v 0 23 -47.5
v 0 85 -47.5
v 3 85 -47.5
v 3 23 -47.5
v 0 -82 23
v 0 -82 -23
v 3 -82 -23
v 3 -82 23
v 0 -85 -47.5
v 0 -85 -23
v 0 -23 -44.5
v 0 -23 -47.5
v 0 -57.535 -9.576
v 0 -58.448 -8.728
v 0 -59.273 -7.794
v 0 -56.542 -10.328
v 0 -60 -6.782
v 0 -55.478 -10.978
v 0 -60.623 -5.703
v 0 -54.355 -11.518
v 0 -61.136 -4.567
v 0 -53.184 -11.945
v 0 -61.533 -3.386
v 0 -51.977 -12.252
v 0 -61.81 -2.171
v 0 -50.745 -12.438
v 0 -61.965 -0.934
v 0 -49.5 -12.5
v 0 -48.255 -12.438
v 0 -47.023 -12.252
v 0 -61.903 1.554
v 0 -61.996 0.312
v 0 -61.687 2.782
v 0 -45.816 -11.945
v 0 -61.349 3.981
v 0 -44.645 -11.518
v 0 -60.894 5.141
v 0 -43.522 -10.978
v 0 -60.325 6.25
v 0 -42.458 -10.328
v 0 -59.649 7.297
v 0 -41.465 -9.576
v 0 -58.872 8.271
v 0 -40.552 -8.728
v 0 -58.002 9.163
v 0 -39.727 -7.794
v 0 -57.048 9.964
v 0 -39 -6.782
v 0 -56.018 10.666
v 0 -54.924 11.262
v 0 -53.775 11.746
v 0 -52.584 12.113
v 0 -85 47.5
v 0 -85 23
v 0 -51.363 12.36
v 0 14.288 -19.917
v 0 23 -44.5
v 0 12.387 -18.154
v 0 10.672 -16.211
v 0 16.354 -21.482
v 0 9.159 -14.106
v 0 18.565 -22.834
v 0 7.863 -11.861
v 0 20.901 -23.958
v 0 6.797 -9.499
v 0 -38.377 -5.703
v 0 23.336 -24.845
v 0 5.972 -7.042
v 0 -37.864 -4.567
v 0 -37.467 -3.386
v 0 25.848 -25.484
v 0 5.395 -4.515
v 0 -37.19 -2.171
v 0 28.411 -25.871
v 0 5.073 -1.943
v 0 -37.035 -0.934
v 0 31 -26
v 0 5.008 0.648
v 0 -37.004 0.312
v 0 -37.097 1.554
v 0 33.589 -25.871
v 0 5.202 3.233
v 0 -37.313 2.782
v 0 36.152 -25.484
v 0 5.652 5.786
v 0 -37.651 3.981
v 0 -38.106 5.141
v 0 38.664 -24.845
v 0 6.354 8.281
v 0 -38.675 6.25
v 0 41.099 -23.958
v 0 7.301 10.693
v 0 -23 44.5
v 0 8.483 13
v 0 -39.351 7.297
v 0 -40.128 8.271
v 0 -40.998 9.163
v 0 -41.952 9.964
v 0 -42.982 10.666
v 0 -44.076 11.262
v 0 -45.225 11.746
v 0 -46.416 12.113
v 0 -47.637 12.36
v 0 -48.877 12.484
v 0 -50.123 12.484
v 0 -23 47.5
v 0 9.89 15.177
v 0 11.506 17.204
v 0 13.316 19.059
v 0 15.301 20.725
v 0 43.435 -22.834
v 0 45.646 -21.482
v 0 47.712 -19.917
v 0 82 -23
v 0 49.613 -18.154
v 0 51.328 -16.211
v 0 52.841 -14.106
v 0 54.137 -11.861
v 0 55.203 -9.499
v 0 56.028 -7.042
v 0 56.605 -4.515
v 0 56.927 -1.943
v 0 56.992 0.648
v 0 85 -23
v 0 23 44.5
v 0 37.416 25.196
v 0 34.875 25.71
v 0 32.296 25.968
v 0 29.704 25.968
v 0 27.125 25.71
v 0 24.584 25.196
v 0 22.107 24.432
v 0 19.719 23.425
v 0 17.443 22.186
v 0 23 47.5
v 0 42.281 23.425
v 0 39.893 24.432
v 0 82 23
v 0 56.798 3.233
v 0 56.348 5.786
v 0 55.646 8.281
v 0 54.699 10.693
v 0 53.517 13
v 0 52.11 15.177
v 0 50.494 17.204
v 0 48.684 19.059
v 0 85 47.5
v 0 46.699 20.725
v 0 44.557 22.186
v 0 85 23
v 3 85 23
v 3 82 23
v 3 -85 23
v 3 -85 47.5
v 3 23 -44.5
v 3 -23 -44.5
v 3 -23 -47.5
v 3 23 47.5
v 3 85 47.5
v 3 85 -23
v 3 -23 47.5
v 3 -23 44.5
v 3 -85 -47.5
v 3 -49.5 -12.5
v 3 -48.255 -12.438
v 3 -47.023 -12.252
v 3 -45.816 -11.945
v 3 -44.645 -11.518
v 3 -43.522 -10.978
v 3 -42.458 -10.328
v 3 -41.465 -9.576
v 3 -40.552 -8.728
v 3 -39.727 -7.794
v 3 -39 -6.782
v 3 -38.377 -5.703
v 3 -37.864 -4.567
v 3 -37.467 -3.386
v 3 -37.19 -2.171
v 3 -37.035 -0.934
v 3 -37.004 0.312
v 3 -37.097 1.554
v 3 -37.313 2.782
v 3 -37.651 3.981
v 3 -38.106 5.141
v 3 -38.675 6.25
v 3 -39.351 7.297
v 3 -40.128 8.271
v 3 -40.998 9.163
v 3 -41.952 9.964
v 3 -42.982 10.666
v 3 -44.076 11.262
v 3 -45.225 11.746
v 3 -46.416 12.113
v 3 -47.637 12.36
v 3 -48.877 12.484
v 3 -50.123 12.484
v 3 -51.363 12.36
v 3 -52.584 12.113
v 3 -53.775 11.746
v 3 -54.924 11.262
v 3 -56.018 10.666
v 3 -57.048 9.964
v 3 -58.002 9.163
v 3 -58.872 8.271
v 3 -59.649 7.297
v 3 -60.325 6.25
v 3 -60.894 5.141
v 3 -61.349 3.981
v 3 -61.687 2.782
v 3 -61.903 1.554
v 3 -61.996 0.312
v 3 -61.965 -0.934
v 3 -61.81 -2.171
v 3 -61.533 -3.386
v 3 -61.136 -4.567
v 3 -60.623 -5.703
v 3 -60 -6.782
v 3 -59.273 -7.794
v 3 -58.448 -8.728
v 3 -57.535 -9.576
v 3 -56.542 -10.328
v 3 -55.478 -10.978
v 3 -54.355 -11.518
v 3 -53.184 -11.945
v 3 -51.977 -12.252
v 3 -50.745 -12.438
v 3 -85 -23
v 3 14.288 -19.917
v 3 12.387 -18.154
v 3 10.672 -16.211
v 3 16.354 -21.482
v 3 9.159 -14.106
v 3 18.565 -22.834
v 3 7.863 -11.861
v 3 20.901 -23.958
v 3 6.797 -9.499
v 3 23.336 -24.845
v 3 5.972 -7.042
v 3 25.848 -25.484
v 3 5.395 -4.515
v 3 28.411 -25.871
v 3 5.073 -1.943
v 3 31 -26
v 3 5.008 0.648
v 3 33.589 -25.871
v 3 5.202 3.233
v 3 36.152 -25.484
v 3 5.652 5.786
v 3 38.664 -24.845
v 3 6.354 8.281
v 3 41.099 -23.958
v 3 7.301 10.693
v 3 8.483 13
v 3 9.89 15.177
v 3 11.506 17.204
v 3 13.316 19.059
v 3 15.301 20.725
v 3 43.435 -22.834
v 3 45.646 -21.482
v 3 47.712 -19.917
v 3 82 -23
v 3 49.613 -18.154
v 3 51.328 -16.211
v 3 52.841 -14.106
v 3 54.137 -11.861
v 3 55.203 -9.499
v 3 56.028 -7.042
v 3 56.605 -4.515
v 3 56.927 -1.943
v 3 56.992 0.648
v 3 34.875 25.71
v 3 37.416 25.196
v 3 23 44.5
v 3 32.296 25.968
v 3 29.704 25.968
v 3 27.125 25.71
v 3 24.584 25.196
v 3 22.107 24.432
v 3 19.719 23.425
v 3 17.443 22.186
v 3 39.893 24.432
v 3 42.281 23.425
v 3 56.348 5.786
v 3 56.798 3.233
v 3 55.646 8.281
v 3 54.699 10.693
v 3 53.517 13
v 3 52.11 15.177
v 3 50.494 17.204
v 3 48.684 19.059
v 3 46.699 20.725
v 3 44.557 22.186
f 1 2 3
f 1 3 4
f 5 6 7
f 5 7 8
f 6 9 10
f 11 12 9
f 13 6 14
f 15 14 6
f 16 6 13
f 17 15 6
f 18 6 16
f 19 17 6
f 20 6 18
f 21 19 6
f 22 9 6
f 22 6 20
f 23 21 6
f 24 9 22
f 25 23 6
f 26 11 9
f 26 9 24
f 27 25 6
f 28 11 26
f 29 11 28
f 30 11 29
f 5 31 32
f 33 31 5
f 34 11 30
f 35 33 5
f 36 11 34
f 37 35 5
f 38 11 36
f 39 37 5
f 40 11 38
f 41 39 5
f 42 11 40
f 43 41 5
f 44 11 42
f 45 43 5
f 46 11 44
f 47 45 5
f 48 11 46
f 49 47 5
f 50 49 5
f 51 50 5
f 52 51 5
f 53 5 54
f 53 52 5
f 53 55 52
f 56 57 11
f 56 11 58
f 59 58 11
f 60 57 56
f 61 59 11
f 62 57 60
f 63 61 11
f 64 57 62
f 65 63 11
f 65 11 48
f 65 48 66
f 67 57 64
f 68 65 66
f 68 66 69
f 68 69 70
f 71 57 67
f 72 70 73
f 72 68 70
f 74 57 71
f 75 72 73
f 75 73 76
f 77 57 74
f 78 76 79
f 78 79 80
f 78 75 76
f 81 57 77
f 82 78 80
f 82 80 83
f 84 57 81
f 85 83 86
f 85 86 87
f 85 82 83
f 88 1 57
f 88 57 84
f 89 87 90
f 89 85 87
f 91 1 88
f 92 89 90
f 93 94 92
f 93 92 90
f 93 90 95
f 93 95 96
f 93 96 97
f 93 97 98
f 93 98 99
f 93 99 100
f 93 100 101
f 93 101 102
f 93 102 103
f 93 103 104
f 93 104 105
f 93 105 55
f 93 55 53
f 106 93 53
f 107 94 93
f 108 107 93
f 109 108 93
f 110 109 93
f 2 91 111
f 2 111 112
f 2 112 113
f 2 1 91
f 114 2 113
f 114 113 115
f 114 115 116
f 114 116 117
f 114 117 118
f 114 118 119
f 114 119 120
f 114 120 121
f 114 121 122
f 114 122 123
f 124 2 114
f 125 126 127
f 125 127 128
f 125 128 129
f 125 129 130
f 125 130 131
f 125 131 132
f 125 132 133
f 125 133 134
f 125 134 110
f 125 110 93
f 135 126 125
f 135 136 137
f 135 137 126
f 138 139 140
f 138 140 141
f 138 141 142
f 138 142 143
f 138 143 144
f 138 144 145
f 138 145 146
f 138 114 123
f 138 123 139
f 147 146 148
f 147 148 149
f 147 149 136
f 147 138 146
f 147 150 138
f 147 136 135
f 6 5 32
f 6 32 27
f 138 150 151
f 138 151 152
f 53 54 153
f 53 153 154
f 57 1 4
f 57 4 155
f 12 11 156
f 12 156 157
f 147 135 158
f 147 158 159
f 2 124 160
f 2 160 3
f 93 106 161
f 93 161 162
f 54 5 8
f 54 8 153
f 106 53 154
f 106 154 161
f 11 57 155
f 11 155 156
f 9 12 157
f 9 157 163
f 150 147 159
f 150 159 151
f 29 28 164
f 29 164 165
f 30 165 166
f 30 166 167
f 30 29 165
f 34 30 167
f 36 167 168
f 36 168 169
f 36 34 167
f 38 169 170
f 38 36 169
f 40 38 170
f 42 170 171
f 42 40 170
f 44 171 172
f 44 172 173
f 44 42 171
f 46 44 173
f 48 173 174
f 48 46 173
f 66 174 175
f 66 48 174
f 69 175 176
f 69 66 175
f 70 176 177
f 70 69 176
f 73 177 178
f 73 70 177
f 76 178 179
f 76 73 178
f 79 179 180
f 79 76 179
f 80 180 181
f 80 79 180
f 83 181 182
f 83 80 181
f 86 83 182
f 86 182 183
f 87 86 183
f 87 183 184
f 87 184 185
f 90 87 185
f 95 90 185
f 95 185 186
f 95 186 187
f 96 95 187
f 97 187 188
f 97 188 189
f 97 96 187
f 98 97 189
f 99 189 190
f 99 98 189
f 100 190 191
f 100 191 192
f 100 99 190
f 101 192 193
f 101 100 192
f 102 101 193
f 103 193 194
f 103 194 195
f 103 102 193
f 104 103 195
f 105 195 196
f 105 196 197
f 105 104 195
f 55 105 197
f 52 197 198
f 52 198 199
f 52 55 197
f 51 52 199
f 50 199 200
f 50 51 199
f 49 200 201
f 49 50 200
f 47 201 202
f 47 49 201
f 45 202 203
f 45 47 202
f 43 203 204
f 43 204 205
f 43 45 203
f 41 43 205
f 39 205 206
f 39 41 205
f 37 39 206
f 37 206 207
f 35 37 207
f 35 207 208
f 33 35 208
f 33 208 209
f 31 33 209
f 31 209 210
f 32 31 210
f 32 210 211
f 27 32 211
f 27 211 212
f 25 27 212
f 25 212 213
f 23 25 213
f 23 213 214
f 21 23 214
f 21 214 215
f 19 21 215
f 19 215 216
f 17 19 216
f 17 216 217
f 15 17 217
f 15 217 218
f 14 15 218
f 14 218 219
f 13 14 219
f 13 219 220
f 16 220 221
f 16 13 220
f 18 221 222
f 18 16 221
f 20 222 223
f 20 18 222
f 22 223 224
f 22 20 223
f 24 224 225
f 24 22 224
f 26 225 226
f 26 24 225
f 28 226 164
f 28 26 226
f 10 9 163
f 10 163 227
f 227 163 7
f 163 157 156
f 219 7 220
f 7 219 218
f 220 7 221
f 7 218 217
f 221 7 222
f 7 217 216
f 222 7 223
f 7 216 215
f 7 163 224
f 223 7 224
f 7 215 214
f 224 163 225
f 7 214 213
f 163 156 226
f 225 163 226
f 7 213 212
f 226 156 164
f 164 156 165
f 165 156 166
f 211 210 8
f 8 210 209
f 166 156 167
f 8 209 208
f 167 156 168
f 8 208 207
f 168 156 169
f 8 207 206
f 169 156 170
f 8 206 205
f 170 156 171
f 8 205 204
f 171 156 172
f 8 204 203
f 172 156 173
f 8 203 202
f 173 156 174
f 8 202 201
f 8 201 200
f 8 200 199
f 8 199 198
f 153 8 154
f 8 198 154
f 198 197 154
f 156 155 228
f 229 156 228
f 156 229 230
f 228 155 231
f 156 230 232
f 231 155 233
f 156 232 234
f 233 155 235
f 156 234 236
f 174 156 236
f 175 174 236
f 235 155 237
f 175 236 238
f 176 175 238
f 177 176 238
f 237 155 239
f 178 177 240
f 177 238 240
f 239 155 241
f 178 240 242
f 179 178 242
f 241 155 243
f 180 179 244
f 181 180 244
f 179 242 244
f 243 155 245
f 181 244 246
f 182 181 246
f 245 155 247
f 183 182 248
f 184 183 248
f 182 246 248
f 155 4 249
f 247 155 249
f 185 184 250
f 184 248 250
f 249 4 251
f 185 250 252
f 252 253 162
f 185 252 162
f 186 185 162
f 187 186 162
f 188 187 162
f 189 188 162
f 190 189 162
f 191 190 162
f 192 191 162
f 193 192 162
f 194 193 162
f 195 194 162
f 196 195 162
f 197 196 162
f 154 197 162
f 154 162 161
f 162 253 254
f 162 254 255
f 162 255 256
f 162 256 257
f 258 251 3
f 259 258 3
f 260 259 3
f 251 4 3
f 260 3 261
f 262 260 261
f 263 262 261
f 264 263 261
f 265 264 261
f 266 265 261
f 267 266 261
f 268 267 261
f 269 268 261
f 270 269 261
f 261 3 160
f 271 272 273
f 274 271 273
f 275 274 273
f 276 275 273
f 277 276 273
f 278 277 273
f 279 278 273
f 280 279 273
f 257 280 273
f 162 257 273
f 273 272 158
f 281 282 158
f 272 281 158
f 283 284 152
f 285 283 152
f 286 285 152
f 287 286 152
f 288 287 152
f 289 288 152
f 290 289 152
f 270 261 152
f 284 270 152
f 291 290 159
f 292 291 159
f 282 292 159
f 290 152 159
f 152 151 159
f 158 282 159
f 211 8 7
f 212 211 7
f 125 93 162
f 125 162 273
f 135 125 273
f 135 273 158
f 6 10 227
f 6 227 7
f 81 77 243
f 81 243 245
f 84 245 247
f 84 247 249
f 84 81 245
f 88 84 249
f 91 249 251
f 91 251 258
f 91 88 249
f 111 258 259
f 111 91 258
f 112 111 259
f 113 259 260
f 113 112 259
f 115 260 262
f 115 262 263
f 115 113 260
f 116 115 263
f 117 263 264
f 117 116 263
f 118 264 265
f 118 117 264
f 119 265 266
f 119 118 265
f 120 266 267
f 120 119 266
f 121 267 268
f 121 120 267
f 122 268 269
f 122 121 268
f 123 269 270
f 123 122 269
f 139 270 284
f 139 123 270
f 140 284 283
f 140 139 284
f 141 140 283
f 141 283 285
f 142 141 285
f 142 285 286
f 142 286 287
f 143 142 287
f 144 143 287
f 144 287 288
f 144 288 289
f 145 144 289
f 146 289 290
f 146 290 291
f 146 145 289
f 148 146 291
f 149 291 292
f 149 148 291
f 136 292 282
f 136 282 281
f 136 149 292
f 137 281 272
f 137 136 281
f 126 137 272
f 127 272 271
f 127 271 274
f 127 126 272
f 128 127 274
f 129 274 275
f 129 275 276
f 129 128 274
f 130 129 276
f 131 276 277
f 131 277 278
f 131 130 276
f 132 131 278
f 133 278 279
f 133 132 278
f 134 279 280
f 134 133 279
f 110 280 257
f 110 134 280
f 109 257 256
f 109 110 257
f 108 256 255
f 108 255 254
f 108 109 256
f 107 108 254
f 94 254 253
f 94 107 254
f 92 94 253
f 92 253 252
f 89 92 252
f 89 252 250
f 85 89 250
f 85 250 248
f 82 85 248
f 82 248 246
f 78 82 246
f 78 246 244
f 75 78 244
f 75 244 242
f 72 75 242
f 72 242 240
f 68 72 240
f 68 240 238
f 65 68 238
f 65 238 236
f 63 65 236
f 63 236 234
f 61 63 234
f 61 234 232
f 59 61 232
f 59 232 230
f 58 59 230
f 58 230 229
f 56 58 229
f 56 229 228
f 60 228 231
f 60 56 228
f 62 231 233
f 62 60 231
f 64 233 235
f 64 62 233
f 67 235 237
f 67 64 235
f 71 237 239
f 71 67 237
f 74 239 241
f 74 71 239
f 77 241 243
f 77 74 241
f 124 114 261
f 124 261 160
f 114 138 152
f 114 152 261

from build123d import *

# Parameters (mm, degrees)
CROQUIS1_R              = 26
CROQUIS1_R_2            = 12.5
SALIENTE_EXTRUIR1_DEPTH = 3


with BuildPart() as part:
    # Croquis1 → Saliente-Extruir1 (new body)
    with BuildSketch(Plane(origin=(0, 0, 0), x_dir=(0, 0, -1), z_dir=(1, 0, 0))):
        Polygon((-23, 82), (23, 82), (23, 85), (47.5, 85), (47.5, 23), (44.5, 23), (44.5, -23), (47.5, -23), (47.5, -85), (23, -85), (23, -82), (-23, -82), (-23, -85), (-47.5, -85), (-47.5, -23), (-44.5, -23), (-44.5, 23), (-47.5, 23), (-47.5, 85), (-23, 85), align=None)
        with Locations((0, 31)):
            Circle(CROQUIS1_R, mode=Mode.SUBTRACT)
        with Locations((0, -49.5)):
            Circle(CROQUIS1_R_2, mode=Mode.SUBTRACT)
    extrude(amount=SALIENTE_EXTRUIR1_DEPTH)


solid = part.part
